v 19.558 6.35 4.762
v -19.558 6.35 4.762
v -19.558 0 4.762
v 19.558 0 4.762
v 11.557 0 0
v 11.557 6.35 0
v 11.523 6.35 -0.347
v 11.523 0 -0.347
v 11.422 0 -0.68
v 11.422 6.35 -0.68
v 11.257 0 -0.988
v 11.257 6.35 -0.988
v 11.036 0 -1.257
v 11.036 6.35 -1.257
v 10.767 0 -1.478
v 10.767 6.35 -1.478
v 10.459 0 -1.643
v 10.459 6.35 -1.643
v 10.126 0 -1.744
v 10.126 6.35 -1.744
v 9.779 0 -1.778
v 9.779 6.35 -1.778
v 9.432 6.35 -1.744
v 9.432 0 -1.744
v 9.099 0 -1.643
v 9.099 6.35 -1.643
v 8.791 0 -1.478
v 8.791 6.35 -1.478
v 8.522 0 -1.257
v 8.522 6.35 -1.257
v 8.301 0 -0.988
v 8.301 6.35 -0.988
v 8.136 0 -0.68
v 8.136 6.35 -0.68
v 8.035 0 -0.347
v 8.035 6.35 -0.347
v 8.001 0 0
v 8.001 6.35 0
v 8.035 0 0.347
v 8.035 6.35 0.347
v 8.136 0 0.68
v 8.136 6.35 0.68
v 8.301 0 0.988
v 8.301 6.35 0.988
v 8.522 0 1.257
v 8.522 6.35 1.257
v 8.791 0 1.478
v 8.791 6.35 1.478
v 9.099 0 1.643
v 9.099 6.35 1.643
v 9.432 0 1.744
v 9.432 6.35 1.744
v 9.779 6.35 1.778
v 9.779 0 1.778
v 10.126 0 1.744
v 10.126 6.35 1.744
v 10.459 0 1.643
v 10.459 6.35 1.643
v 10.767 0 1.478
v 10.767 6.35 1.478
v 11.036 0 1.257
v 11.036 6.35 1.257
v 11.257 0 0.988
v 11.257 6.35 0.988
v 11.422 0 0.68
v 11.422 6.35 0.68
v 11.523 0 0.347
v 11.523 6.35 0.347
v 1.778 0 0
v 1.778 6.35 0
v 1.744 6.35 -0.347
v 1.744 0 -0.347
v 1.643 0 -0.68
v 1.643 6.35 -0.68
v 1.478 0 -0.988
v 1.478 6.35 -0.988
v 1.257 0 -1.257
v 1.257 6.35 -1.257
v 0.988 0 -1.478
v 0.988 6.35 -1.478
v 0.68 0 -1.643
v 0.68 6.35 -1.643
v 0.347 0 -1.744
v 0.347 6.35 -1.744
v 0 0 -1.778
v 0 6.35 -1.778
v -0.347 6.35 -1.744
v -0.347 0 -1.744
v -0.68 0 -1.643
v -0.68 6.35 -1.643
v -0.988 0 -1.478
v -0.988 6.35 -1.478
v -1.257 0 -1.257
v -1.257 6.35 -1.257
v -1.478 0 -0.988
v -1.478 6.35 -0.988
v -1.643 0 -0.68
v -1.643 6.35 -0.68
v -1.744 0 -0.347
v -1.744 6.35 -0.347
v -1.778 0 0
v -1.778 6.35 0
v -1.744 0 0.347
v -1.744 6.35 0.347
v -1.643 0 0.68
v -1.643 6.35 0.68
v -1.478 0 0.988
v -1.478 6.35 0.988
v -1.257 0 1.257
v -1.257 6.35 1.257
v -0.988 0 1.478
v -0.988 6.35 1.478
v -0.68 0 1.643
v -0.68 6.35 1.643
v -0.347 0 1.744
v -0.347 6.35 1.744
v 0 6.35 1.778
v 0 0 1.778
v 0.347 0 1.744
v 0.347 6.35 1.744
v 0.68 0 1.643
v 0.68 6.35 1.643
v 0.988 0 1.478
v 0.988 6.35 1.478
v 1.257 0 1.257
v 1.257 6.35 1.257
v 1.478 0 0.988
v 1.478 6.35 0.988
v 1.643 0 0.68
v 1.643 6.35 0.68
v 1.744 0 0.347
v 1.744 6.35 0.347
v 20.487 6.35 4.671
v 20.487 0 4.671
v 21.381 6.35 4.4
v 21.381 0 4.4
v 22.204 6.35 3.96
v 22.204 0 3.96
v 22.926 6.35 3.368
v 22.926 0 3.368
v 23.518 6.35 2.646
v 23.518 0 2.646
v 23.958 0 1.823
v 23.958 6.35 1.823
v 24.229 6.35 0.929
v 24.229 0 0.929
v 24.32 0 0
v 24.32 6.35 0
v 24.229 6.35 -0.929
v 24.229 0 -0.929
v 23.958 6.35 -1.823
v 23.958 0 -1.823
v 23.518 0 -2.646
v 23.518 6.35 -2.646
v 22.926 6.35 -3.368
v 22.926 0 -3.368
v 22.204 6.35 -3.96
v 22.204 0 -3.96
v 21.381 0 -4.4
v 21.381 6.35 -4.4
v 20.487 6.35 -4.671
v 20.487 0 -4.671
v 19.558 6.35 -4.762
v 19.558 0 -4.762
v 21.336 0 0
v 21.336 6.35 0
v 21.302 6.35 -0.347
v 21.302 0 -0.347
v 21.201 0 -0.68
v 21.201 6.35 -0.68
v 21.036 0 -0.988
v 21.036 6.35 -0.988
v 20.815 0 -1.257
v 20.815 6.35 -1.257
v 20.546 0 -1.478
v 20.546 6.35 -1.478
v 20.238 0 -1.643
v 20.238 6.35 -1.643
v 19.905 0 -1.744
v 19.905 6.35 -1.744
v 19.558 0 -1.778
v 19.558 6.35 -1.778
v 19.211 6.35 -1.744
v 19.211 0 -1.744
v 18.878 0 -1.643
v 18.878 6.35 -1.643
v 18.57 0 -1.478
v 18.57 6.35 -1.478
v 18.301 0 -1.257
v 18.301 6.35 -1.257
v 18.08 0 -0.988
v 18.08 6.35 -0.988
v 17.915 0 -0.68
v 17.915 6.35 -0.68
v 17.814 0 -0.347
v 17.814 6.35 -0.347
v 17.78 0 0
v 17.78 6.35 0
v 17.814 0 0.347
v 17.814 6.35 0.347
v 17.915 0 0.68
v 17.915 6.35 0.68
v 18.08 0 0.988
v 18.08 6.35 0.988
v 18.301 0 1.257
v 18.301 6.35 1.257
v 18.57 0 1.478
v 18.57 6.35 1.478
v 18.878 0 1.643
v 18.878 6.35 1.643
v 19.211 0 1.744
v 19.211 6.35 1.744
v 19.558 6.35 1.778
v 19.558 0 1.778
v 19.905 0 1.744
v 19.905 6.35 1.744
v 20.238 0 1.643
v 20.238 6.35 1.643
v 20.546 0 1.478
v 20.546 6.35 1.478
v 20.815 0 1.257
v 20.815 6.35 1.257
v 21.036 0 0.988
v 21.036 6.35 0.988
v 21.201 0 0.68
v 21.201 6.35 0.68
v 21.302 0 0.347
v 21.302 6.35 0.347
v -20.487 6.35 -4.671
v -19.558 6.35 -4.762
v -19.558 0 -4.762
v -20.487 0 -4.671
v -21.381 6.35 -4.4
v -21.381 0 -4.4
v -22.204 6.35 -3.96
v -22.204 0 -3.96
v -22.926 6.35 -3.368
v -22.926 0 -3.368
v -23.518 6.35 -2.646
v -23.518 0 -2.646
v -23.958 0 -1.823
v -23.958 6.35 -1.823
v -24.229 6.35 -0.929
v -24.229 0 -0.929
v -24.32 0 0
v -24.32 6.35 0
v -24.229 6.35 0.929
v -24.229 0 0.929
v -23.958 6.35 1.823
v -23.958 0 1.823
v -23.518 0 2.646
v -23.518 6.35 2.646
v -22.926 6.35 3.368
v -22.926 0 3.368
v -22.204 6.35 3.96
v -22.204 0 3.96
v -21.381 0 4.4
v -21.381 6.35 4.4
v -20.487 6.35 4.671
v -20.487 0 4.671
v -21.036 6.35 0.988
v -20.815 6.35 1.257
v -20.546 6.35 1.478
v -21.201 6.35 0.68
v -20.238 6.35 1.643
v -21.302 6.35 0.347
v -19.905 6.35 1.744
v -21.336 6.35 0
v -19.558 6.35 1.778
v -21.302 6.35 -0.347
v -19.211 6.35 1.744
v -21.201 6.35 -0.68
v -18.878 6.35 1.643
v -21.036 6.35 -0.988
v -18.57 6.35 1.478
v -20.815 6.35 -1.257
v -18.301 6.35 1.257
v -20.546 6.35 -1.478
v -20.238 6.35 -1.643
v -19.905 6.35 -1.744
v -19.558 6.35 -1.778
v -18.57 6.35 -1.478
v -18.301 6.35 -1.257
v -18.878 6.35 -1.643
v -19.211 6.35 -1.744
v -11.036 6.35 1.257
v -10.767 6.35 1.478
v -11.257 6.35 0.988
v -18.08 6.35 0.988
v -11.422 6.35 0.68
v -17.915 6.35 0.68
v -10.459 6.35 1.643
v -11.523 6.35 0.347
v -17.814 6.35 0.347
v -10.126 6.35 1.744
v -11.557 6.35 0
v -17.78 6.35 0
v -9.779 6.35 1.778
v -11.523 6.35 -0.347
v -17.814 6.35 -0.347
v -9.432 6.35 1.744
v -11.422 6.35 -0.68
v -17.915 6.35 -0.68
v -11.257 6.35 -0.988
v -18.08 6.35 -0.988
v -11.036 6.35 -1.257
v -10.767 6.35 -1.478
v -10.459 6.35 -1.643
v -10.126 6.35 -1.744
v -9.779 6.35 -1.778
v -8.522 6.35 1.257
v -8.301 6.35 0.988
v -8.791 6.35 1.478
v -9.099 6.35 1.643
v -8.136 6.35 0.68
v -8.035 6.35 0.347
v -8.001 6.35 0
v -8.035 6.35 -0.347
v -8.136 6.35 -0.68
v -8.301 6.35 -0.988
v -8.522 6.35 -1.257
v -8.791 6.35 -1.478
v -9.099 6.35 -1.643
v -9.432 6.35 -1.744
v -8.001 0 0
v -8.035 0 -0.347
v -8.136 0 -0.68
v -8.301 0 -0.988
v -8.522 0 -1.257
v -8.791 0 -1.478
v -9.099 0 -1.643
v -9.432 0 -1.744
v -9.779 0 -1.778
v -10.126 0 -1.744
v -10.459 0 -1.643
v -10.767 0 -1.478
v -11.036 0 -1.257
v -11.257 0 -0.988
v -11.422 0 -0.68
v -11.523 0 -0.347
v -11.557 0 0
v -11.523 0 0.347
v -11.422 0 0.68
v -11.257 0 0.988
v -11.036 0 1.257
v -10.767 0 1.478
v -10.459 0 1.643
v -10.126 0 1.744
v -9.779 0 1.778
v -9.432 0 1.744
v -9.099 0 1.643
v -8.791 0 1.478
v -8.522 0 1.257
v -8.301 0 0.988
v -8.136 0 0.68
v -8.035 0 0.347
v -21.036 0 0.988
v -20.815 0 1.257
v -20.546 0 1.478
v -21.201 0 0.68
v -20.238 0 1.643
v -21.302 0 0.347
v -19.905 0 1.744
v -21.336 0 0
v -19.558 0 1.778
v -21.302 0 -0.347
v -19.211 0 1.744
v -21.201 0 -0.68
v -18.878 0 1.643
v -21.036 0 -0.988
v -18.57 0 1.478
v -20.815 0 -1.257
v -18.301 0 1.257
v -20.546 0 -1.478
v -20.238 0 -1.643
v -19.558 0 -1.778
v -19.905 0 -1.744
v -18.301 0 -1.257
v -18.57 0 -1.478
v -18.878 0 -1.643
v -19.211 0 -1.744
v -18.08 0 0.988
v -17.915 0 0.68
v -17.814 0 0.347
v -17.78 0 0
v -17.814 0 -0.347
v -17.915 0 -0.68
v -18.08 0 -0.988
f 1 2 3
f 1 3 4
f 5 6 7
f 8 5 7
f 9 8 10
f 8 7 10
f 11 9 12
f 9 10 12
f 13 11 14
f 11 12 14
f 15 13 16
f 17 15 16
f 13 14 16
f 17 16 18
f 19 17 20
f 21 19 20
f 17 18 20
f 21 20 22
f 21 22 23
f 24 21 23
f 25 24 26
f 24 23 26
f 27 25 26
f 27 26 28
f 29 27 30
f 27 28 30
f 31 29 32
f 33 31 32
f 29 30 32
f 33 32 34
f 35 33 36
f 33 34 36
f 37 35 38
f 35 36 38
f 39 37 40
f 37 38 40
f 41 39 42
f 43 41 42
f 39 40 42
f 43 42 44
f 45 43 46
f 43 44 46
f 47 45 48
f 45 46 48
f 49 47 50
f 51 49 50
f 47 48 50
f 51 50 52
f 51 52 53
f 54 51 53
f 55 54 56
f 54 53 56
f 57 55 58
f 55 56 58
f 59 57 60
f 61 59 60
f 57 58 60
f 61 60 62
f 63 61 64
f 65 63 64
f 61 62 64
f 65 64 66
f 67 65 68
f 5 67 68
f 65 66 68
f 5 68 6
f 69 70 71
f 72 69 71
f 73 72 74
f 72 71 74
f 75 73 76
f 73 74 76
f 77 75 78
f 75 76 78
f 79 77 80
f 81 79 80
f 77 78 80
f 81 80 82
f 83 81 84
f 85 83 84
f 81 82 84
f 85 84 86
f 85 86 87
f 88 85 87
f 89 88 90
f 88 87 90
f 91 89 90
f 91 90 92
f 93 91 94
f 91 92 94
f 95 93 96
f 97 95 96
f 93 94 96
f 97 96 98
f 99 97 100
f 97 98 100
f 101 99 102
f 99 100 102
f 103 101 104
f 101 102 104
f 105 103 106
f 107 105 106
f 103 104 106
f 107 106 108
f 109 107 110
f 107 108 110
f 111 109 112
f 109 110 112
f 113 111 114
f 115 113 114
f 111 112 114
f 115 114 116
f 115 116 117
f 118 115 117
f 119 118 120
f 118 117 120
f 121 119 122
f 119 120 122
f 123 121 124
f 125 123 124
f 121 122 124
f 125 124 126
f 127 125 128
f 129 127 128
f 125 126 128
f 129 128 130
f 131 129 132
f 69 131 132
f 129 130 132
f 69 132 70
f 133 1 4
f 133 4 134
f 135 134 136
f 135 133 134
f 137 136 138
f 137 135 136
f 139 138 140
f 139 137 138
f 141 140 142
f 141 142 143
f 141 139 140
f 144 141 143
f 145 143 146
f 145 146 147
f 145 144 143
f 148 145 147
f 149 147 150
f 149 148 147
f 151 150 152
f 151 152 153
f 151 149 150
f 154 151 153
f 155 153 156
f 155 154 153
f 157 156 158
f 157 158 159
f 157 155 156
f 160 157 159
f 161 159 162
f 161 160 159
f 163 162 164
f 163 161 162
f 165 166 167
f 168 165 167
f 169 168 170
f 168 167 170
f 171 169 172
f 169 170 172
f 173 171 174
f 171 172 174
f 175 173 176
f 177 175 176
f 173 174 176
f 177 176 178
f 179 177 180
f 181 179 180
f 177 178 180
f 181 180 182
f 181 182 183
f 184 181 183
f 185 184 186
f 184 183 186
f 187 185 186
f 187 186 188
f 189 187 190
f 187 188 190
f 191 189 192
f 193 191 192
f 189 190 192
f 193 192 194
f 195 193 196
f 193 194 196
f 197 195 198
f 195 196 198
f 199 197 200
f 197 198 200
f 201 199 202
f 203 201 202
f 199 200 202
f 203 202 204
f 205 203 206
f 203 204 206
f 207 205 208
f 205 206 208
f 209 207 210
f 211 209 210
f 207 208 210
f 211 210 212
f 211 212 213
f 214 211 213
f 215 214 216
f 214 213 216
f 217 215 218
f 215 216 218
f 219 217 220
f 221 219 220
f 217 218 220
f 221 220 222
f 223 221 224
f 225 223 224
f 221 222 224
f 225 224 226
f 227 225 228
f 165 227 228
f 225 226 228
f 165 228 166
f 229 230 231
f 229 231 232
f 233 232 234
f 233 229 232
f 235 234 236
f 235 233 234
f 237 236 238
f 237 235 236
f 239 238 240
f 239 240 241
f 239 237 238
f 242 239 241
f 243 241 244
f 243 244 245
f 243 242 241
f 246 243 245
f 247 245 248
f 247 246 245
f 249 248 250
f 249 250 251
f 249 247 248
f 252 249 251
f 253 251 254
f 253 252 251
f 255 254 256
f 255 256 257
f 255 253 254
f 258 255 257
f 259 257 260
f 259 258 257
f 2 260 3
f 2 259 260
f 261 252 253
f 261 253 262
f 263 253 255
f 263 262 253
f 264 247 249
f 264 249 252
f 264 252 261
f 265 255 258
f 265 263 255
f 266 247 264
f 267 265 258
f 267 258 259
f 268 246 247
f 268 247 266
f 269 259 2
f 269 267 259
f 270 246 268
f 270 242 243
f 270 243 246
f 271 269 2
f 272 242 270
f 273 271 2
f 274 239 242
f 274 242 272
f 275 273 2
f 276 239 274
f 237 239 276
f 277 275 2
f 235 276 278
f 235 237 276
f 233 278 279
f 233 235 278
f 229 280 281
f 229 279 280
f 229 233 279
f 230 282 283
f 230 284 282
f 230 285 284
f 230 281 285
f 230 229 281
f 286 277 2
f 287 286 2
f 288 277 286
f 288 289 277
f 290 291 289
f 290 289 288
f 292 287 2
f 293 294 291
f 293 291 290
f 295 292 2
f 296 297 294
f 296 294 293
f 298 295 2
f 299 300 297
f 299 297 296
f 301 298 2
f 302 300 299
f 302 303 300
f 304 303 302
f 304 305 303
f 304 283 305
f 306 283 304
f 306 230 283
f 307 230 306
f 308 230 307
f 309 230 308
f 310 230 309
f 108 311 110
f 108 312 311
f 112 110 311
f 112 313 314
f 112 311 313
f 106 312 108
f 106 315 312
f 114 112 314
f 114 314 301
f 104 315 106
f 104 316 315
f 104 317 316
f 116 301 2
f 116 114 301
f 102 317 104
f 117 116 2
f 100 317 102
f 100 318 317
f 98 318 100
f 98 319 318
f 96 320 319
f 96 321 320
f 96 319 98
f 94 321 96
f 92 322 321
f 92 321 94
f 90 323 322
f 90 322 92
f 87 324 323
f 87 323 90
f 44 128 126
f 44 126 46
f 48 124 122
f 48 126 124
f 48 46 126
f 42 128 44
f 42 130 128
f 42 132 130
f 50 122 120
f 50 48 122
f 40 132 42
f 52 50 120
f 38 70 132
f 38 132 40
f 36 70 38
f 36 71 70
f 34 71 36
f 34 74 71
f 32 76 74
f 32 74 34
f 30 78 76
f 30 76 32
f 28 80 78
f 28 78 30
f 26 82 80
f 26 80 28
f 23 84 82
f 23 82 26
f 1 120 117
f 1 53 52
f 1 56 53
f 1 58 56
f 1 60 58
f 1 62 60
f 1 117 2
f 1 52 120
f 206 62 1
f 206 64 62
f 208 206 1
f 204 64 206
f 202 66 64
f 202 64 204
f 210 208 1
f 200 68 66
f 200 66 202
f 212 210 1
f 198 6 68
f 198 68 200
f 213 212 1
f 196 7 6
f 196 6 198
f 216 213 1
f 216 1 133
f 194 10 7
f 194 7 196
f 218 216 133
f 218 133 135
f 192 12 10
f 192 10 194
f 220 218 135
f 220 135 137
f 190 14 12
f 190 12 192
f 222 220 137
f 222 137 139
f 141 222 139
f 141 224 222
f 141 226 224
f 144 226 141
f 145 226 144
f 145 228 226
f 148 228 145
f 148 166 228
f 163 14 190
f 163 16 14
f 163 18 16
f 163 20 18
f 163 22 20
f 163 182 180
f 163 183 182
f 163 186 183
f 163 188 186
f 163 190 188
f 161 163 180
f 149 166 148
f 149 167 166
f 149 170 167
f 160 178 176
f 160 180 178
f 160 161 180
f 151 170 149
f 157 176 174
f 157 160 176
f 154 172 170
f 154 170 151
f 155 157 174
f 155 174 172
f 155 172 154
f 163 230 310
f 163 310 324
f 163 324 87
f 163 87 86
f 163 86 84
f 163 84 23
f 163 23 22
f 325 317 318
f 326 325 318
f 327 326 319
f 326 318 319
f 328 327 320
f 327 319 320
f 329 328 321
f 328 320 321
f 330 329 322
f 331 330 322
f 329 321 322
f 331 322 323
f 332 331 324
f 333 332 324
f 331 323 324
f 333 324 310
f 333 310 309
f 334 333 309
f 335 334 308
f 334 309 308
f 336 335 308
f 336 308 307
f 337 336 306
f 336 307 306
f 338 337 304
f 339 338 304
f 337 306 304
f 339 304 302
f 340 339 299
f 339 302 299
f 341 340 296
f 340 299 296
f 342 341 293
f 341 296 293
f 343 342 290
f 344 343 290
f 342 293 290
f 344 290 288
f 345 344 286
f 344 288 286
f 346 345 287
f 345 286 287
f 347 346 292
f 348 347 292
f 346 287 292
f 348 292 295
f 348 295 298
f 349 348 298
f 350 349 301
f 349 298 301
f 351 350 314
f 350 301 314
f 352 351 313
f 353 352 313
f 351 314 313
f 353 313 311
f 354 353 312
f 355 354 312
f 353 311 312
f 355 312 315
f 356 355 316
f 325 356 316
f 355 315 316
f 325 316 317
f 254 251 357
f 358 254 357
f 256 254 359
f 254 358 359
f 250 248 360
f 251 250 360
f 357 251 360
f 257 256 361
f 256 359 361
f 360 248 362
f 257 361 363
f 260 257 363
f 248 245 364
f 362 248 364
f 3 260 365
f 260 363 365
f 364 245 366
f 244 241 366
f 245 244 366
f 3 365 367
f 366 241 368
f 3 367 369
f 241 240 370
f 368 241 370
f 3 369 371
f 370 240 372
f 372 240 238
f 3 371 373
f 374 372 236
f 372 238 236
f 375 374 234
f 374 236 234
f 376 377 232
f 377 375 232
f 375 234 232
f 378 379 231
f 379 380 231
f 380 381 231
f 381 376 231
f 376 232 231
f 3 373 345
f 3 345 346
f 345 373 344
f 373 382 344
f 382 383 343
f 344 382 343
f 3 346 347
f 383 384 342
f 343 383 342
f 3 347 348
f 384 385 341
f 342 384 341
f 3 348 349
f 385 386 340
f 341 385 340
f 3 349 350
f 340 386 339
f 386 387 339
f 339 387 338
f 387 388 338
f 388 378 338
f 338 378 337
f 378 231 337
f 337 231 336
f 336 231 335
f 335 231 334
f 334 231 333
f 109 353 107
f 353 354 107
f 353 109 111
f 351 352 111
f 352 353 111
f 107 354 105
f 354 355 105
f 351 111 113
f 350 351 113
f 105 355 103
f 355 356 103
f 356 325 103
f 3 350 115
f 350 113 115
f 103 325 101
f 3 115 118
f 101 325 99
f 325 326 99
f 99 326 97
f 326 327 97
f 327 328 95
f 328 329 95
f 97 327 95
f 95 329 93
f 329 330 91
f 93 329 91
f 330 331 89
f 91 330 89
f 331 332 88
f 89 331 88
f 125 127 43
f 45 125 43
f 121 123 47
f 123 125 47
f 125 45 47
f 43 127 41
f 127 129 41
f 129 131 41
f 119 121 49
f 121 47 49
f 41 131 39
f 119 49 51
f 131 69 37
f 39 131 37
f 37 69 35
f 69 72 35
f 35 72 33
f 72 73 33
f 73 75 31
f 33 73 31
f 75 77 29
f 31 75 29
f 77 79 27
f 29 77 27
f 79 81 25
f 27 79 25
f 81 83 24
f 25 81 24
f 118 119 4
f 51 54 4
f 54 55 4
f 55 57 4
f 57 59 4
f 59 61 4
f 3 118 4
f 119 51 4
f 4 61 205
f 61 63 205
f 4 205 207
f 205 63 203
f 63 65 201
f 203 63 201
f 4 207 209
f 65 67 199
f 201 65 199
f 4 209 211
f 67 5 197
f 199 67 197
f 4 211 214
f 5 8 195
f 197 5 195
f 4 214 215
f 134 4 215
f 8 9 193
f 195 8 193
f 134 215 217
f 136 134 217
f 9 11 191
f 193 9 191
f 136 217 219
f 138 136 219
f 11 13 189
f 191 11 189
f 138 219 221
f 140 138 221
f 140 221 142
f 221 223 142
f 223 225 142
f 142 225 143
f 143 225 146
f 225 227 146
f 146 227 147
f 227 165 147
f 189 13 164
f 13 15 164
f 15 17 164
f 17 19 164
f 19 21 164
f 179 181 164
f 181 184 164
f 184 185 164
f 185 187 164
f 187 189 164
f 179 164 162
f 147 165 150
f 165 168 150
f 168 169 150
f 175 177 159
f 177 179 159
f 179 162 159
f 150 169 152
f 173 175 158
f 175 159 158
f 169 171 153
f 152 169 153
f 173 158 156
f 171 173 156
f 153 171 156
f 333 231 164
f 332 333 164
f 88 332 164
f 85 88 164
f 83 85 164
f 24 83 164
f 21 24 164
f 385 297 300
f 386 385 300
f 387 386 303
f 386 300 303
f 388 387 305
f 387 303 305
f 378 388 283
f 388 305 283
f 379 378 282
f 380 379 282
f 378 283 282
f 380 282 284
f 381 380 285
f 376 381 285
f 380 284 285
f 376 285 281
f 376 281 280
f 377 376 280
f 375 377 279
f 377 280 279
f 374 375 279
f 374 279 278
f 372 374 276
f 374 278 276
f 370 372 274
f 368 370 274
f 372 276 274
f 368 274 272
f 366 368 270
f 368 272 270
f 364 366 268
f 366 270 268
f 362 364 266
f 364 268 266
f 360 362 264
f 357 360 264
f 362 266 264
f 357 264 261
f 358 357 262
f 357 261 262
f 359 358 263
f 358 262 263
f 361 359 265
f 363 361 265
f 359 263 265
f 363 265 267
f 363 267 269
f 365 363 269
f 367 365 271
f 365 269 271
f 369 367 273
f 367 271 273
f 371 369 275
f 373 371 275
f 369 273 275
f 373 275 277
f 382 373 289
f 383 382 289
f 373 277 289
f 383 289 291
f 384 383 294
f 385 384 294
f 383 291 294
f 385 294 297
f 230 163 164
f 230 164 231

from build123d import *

# Parameters (mm, degrees)
SKETCH1_R           = 1.778
BOSS_EXTRUDE1_DEPTH = 6.35


with BuildPart() as part:
    # Sketch1 → Boss-Extrude1 (new body)
    with BuildSketch(Plane(origin=(0, 6.35, 0), x_dir=(1, 0, 0), z_dir=(0, 1, 0))):
        with BuildLine():
            Line((19.558, 4.7625), (-19.558, 4.7625))
            ThreePointArc((-19.558, 4.7625), (-24.3205, 0), (-19.558, -4.7625))
            Line((-19.558, -4.7625), (19.558, -4.7625))
            ThreePointArc((19.558, -4.7625), (24.3205, 0), (19.558, 4.7625))
        make_face()
        with Locations((19.558, 0)):
            Circle(SKETCH1_R, mode=Mode.SUBTRACT)
        with Locations((9.779, 0)):
            Circle(SKETCH1_R, mode=Mode.SUBTRACT)
        Circle(SKETCH1_R, mode=Mode.SUBTRACT)
        with Locations((-9.779, 0)):
            Circle(SKETCH1_R, mode=Mode.SUBTRACT)
        with Locations((-19.558, 0)):
            Circle(SKETCH1_R, mode=Mode.SUBTRACT)
    extrude(amount=-BOSS_EXTRUDE1_DEPTH)


solid = part.part
